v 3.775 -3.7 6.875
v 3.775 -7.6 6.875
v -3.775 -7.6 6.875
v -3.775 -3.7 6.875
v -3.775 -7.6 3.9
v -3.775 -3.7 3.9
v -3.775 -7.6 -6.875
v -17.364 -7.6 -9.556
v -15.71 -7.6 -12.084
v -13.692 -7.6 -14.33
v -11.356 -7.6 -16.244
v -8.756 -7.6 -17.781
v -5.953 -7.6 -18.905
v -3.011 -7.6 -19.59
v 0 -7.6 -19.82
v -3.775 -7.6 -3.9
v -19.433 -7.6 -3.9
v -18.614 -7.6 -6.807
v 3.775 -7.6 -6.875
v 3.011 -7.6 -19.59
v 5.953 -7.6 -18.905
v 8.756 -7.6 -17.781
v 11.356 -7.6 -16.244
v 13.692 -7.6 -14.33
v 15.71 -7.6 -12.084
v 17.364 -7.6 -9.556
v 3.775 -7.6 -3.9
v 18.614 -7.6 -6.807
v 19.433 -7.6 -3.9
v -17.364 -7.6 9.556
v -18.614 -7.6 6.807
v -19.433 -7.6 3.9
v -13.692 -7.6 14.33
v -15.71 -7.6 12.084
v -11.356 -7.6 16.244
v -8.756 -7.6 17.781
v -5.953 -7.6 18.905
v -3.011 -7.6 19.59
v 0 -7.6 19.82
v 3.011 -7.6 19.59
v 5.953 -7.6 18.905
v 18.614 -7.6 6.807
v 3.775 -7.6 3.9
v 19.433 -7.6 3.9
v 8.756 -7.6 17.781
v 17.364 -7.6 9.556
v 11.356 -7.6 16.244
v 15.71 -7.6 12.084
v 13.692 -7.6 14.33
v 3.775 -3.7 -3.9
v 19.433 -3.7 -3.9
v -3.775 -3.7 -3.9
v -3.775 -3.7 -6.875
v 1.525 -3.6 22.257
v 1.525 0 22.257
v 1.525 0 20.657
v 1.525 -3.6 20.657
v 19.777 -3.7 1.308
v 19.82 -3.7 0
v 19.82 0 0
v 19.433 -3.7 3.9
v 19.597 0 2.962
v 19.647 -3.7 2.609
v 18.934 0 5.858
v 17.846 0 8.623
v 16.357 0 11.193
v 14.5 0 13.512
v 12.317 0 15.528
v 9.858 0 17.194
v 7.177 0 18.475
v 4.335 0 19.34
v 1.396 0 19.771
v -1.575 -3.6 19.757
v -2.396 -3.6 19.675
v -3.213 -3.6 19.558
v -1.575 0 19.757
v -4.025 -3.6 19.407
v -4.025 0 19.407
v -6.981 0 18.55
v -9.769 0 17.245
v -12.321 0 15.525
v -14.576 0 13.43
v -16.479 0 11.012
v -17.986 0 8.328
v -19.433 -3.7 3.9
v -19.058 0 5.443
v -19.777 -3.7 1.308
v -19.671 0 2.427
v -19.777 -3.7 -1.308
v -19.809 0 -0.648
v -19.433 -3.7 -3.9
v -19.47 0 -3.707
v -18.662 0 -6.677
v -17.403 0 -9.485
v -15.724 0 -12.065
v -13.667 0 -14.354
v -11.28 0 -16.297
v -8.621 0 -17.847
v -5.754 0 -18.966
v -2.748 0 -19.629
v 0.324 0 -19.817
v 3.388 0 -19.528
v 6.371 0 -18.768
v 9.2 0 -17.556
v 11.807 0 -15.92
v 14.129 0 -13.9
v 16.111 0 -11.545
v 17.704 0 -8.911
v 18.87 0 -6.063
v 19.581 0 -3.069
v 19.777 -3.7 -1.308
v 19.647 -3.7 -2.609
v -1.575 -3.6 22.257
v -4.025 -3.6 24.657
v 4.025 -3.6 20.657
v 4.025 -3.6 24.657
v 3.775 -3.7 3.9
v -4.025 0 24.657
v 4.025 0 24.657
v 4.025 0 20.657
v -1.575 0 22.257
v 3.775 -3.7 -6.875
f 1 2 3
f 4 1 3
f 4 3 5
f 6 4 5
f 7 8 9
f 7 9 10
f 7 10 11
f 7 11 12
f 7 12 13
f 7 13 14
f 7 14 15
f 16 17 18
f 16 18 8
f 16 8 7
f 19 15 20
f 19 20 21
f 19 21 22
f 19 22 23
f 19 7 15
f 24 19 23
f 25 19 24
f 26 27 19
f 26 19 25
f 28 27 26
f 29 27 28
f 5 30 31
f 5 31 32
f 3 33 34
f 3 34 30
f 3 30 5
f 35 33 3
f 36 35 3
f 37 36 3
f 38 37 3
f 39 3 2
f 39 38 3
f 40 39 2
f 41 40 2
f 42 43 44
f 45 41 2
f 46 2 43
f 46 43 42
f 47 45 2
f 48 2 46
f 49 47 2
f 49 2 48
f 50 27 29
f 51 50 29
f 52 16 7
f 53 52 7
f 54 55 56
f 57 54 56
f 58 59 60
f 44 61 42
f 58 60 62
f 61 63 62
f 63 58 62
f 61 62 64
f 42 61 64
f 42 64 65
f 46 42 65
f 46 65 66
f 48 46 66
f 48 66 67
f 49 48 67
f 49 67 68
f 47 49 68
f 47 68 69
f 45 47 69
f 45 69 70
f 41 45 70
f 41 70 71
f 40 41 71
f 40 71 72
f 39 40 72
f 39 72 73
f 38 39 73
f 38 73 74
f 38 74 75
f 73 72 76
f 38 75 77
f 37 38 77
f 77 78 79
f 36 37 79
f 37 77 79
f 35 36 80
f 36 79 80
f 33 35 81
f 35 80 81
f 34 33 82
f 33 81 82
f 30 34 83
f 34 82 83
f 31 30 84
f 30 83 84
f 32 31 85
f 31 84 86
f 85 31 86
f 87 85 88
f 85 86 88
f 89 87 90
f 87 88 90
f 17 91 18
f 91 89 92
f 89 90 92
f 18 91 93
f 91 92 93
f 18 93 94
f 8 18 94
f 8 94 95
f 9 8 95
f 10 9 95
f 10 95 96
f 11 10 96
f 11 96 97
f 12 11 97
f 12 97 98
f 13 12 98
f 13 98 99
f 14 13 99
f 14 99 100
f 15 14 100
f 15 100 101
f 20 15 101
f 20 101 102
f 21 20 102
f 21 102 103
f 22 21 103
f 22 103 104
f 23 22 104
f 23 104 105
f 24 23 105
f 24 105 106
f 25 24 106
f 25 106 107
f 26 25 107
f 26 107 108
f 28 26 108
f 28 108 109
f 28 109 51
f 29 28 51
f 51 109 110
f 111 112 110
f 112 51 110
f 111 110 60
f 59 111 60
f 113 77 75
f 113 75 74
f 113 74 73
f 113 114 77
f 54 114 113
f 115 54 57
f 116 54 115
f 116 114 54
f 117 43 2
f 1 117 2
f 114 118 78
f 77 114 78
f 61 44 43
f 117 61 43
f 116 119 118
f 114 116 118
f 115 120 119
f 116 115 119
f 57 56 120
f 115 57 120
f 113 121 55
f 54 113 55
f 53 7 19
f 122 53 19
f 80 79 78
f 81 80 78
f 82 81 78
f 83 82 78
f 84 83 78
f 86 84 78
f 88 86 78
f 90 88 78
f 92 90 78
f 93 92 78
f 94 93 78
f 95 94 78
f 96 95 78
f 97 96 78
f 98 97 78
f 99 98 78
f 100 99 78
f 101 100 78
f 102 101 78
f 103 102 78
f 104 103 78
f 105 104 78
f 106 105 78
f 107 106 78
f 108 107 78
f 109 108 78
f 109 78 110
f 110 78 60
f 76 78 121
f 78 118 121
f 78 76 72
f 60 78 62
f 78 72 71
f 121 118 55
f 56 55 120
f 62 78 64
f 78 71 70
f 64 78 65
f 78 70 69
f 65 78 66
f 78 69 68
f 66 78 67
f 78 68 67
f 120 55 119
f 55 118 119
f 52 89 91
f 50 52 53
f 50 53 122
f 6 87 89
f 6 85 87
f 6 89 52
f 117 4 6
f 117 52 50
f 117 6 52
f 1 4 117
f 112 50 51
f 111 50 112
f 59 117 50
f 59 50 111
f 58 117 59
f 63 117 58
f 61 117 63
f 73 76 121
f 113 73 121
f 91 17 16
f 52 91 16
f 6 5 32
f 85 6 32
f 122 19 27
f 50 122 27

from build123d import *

# Parameters (mm, degrees)
F0_R     = 19.82
F1_DEPTH = 7.6
F3_DEPTH = 3.9
F5_DEPTH = 3.6


with BuildPart() as f1:
    # F0 (on Front) → F1 (new body)
    with BuildSketch(Plane.XZ):
        Circle(F0_R)
    extrude(amount=F1_DEPTH)

    # F2 (on face) → F3 (cut)
    with BuildSketch(Plane.XZ.offset(7.6)):
        Polygon((-3.775, 3.9), (-21.085563, 3.9), (-21.085563, -3.9), (-3.775, -3.9), (-3.775, -6.875), (3.775, -6.875), (3.775, -3.9), (21.085563, -3.9), (21.085563, 3.9), (3.775, 3.9), (3.775, 6.875), (-3.775, 6.875), align=None)
    extrude(amount=-F3_DEPTH, mode=Mode.SUBTRACT)

    # F4 (on Front) → F5 (join)
    with BuildSketch(Plane.XZ):
        Polygon((-4.025, 24.657003), (-4.025, 19.407003), (-1.575, 19.407003), (-1.575, 22.257003), (1.525, 22.257003), (1.525, 20.657003), (4.025, 20.657003), (4.025, 24.657003), align=None)
    extrude(amount=F5_DEPTH)


solid = f1.part
